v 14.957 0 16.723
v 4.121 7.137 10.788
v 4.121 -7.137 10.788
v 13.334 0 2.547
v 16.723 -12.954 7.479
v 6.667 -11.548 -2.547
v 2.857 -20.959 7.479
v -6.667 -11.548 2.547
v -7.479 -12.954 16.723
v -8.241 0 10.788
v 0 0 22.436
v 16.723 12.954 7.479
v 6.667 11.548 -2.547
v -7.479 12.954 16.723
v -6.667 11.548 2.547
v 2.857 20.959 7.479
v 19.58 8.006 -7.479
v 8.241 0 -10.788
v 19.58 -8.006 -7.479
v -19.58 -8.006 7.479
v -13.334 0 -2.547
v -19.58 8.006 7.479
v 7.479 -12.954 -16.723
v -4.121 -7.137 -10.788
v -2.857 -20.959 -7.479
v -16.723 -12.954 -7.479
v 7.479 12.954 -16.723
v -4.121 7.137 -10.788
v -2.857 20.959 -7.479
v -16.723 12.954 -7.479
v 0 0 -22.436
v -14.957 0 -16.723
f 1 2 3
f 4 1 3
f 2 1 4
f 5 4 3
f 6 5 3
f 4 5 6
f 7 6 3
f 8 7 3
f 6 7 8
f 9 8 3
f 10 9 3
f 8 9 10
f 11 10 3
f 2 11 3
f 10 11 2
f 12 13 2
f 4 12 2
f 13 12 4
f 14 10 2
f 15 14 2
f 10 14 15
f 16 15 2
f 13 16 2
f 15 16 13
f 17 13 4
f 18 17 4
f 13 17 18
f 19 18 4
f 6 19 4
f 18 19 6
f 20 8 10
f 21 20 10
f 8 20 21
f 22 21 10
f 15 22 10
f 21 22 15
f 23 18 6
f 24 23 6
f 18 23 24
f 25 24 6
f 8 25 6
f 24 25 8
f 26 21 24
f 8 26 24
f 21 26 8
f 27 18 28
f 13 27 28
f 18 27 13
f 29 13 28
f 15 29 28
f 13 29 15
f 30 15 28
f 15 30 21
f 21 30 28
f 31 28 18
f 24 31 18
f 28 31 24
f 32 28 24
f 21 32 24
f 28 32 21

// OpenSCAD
arete = 14.274;
creux = 1; // creux ou plein || 1 ou 0
paroi = 1.5;
echelleReductionAjustementBouchon = 0.97;
bouchon = 0; // 1 ou 0
corps = 0; // 1 ou 0
support = 1;

r = 0.19; // résolution d'impression sur l'axe Z
ico_sch = [3,5];

function ico_ext_radius(a) =
    a*1/4*(sqrt(10+2*sqrt(5)));

function ico_int_radius(a) =
    a/12*(3*sqrt(3)+sqrt(15));

function ico_arete_from(int_radius) =
    int_radius*12/(3*sqrt(3)+sqrt(15));

externalRadius = ico_ext_radius(arete);
internalRadius = ico_ext_radius(
                    ico_arete_from(
                        ico_int_radius(arete)-paroi));

echo("externalRadius:", externalRadius);
echo("externalRadius:", internalRadius);

/* Forme
Choix parmi:
- 0 => Animate // voir plus bas pour plus d'infos
- 1 => Augmenté
- 2 => Phi
- 3 => Pi
- 4 => 40 faces, rhombique ?
- 5 => Tous les sommets sur une spère ?
- 6 => étoilé
- 7 => tous les sommets sur un dodécaèdre
- 8 => Ico
- 9 =>
*/
forme_ID = 1;

/////////
Cphi = (1+sqrt(5))/2;
Cpi = 3.14159;


spike = [
    1.048, // Augmenté (tétraèdres sur chaque face)
    Cphi,
    Cpi,
    1.9,
    sqrt(Cpi),
    0.72,
    1.38,
    2.18
];

if (forme_ID == 0) {
    Animate();
} else {
    if (creux == 0) {
        icosaedre_augmented(arete, spike[forme_ID-1]);
    } else {
        if (corps) {
            corps_ouvert();
            support_base();
        }
        if (bouchon) {
            bouchon();
        }
        if (support) {
            bague_support();
        }
    }
}


//		poly_creux();
//		decoupe_bouchon();

module bague_support() {
    difference() {
        rotate_pointe()
        icosaedre_augmented(externalRadius, spike[forme_ID-1]);
    }
}

module corps_ouvert() {
    rotate([0,180,0])
	render(convexity = 2) difference() {
		poly_creux();
		decoupe_bouchon();
	}
}

module poly_creux() {
    rotate_sur_5_pointes()
    difference() {
        icosaedre_augmented(externalRadius, spike[forme_ID-1]);
        icosaedre_augmented(internalRadius, spike[forme_ID-1]);
    }
}

module decoupe_bouchon(scale=1) {
    distance = ico_int_radius(arete)*0.5625;
	rotate([0,0,54]) translate([0,0, distance])
		cylinder(99, r=arete*2, $fn=5, center=false);
    scale2 = pow(scale,4);
	rotate([0,0,54]) translate([0,0, distance-paroi+0.5+((paroi-0.5)-(paroi-0.5)*scale2)])
		cylinder((paroi-0.5)*scale2, r=(arete-paroi)*0.9*scale, $fn=5, center=false);
}

module supplement_feuillure_bouchon(scale=1) {
    distance = ico_int_radius(arete)*0.5625;
    rotate([0,0,54]) translate([0,0, distance-paroi-1])
    difference() {
		cylinder(paroi+1, r=(arete-paroi)*0.9*scale, $fn=5, center=false);
		cylinder(paroi+1, r=(arete-2*paroi)*0.9*scale, $fn=5, center=false);
    }
}

module bouchon() {
    rotate([0,180,0])
	render(convexity = 2) difference () {
        intersection() {
            union() {
                poly_creux();
                supplement_feuillure_bouchon(echelleReductionAjustementBouchon);
            }
            decoupe_bouchon(echelleReductionAjustementBouchon);
        }
	}
}

module support_base() {
    difference() {
        for (i = [1:5]) {
            rotate([0,0,360/5*i])
            translate([0,arete*1.08, -internalRadius*0.9]) rotate([0,-8.8,90])
            cylinder(5, r=arete*0.6, $fn=3, center=false);
        }
        translate([0,0,-internalRadius*1.51]) cylinder(internalRadius, r=999, $fn=6, center=false);
    }
}

// }}

/*
animates the single parameter of the
module small_stellated_dodecahedron

1/ choose animate in the view menu
2/ sets fps to an appropiate number for
your machine - 20 is good
3/ set steps to a number that keeps the
change from happening too slowly or
too fast - 200 is good
*/
module Animate() {
    icosaedre_augmented(1, 3*abs(2*$t-1)+1);
}

// Étoilé
// scale 1 is arete = 1.236 mm, diametre = 6.24 mm, arete pyramide = 2 mm
module Etoile(a) {
    icosaedre_augmented(a, 2.3417);
}

// Christique
// scale 1 is arete = 1.236 mm, diametre = 4.05 mm
module Christique(a) {
    icosaedre_augmented(a, 0.8944);
}

// Christique inversé
module Christique_inv(a) {
    icosaedre_augmented(a, -0.8944);
}

// Pentakis (all points on sphere)
module Pentakis(a) {
    icosaedre_augmented(a, 0.4279);
}

module rotate_sur_5_pointes() {
    rotate([31.72, 0, 0]) children();
}

module rotate_pointe() {
    rotate([0, 20.905, 0]) children();
}


module icosaedre_augmented(rad=20, amount)
{
    //rad = Cphi;
//    s = rad/Cphi;
    s = rad/amount;
//    s = rad/Cpi/3; // inverted
    echo("drawing with arete=", arete);


	// Convert spherical to cartesian
	function sph_to_cart(c, rad) = [
		rad*sin(atan2(sqrt(c[0]*c[0]+c[1]*c[1]), c[2]))*cos(atan2(c[1],c[0])),
		rad*sin(atan2(sqrt(c[0]*c[0]+c[1]*c[1]), c[2]))*sin(atan2(c[1],c[0])),
		rad*cos(atan2(sqrt(c[0]*c[0]+c[1]*c[1]), c[2]))
		];


	//================================================
	//	Icosahedron
	//================================================
	//
	// (0, +-1, +-Cphi)
	// (+-Cphi, 0, +-1)
	// (+-1, +-Cphi, 0)

	function icosa_unit(rad) = [
		sph_to_cart([0, +1, +Cphi], rad),
		sph_to_cart([0, +1, -Cphi], rad),
		sph_to_cart([0, -1, -Cphi], rad),
		sph_to_cart([0, -1, +Cphi], rad),
		sph_to_cart([+Cphi, 0, +1], rad),
		sph_to_cart([+Cphi, 0, -1], rad),
		sph_to_cart([-Cphi, 0, -1], rad),
		sph_to_cart([-Cphi, 0, +1], rad),
		sph_to_cart([+1, +Cphi, 0], rad),
		sph_to_cart([+1, -Cphi, 0], rad),
		sph_to_cart([-1, -Cphi, 0], rad),
		sph_to_cart([-1, +Cphi, 0], rad),
        [  1.00000*s,  1.00000*s,  1.00000*s],
        [  1.00000*s,  1.00000*s, -1.00000*s],
        [  1.00000*s, -1.00000*s,  1.00000*s],
        [  1.00000*s, -1.00000*s, -1.00000*s],
        [ -1.00000*s,  1.00000*s,  1.00000*s],
        [ -1.00000*s,  1.00000*s, -1.00000*s],
        [ -1.00000*s, -1.00000*s,  1.00000*s],
        [ -1.00000*s, -1.00000*s, -1.00000*s],
        [  0.61803*s,  0.00000*s,  1.61803*s],
        [  0.61803*s,  0.00000*s, -1.61803*s],
        [ -0.61803*s,  0.00000*s,  1.61803*s],
        [ -0.61803*s,  0.00000*s, -1.61803*s],
        [  1.61803*s,  0.61803*s,  0.00000*s],
        [ -1.61803*s,  0.61803*s,  0.00000*s],
        [  1.61803*s, -0.61803*s,  0.00000*s],
        [ -1.61803*s, -0.61803*s,  0.00000*s],
        [  0.00000*s,  1.61803*s,  0.61803*s],
        [  0.00000*s,  1.61803*s, -0.61803*s],
        [  0.00000*s, -1.61803*s,  0.61803*s],
        [  0.00000*s, -1.61803*s, -0.61803*s],
		];

	icosa_faces = [
		[3,0,20],[3,20,4],[4,20,0],
		[3,4,14],[3,14,9],[9,14,4],
		[3,9,30],[3,30,10],[10,30,9],
		[3,10,18],[3,18,7],[7,18,10],
		[3,7,22],[3,22,0],[0,22,7],
		[0,8,12],[0,12,4],[4,12,8],
		[0,7,16],[0,16,11],[11,16,7],
		[0,11,28],[0,28,8],[8,28,11],
		[4,8,24],[4,24,5],[5,24,8],
		[4,5,26],[4,26,9],[9,26,5],
		[7,10,27],[7,27,6],[6,27,10],
		[7,6,25],[7,25,11],[11,25,6],
		[9,5,15],[9,15,2],[2,15,5],
		[9,2,31],[9,31,10],[10,31,2],
		[2,6,19],[2,19,10],[10,19,6],
		[1,5,13],[1,13,8],[8,13,5],
		[1,8,29],[1,29,11],[11,29,8],
		[1,11,17],[6,17,11],[1,17,6],
		[5,1,21],[5,21,2],[2,21,1],
		[2,1,23],[2,23,6],[6,23,1],
		];


    //a=scale*0.61803;
    //b=scale*0.38197;

	polyhedron(icosa_unit(rad), faces = icosa_faces);

/*
constructed from 12 pentagonal pyramids placed
on the faces of a dodecahedron.
first 20 points are the vertices of a dodecahedron
next 12 points are the vertices of the centers
of the faces of the dodecahedron

if scale = 0 a dodecahedron is created

if scale is positive the centers of the
faces are moved out fron the center of the
dodecahedron

if scale is negative the centers of the
faces are moved in towards the center of the
dodecahedron

the apex angles of the triangles that make up
the faces of the stellated dodecahedron
are 36 degrees - the scale factor that
makes a small stellated dodecahedron
is approximately 2.3417
length of side of pentagonal pyramid for
small stellated dodecahedron = 2

the apex angles of the triangles that make up
the faces of a pentakis dodecahedron ( one of
the Catalan solids) are about 68.619 degrees
the scale factor to make one is ca 0.4279

if len = length of the sides of the
pentagonal pyramid then approximately

scale = + or - sqrt((len*len/0.52786) - 2.09443)

lengths of the sides of the base are sqrt(5)-1
or 1.23607 to make equilateral triangles scale
factor is 0.8944

distance from centers of faces to origin ca 1.37638
distance from dodecahedral points to origin sqrt(3)




pcm

*/

//polyhedron
//       (points = [
//                 [   1.00000,   1.00000,   1.00000],
//                 [   1.00000,   1.00000,  -1.00000],
//                 [   1.00000,  -1.00000,   1.00000],
//                 [   1.00000,  -1.00000,  -1.00000],
//                 [  -1.00000,   1.00000,   1.00000],
//                 [  -1.00000,   1.00000,  -1.00000],
//                 [  -1.00000,  -1.00000,   1.00000],
//                 [  -1.00000,  -1.00000,  -1.00000],
//                 [   0.00000,   0.61803,   1.61803],
//                 [   0.00000,   0.61803,  -1.61803],
//                 [   0.00000,  -0.61803,   1.61803],
//                 [   0.00000,  -0.61803,  -1.61803],
//                 [   0.61803,   1.61803,   0.00000],
//                 [   0.61803,  -1.61803,   0.00000],
//                 [  -0.61803,   1.61803,   0.00000],
//                 [  -0.61803,  -1.61803,   0.00000],
//                 [   1.61803,   0.00000,   0.61803],
//                 [   1.61803,   0.00000,  -0.61803],
//                 [  -1.61803,   0.00000,   0.61803],
//                 [  -1.61803,   0.00000,  -0.61803],
//                 [   1.17082+a,   0.72361+b,   0.00000],
//                 [   0.72361+b,   0.00000,   1.17082+a],
//                 [   0.00000,   1.17082+a,   0.72361+b],
//                 [   0.00000,   1.17082+a,  -0.72361-b],
//                 [   0.72361+b,   0.00000,  -1.17082-a],
//                 [   1.17082+a,  -0.72361-b,   0.00000],
//                 [   0.00000,  -1.17082-a,   0.72361+b],
//                 [   0.00000,  -1.17082-a,  -0.72361-b],
//                 [  -0.72361-b,   0.00000,   1.17082+a],
//                 [  -1.17082-a,   0.72361+b,   0.00000],
//                 [  -0.72361-b,   0.00000,  -1.17082-a],
//                 [  -1.17082-a,  -0.72361-b,   0.00000],
//                   ],
//
//           faces = [
//
//                [0,20,16],[16,20,17],[17,20,1],
//                [1,20,12],[12,20,0],
//                [0,21,8],[8,21,10],[10,21,2],
//                [2,21,16],[16,21,0],
//                 [0,22,12],[12,22,14],[14,22,4],
//                [4,22,8],[8,22,0],
//                [1,23,9],[9,23,5],[5,23,14],
//                [14,23,12],[12,23,1],
//                [1,24,17],[17,24,3],[3,24,11],
//                [11,24,9],[9,24,1],
//                [16,25,2],[17,25,16],[3,25,17],
//                 [13,25,3],[2,25,13],
//                 [2,26,10],[10,26,6],[6,26,15],
//                 [15,26,13],[13,26,2],
//                 [3,27,13],[13,27,15],[15,27,7],
//                 [7,27,11],[11,27,3],
//                [4,28,18],[18,28,6],[6,28,10],
//                 [10,28,8],[8,28,4],
//                 [4,29,14],[14,29,5],[5,29,19],
//                 [19,29,18],[18,29,4],
//                  [5,30,9],[9,30,11],[11,30,7],
//                 [7,30,19],[19,30,5],
//                 [6,31,18],[18,31,19],[19,31,7],
//                 [7,31,15],[15,31,6],
//
//                 ]
//      );
}
